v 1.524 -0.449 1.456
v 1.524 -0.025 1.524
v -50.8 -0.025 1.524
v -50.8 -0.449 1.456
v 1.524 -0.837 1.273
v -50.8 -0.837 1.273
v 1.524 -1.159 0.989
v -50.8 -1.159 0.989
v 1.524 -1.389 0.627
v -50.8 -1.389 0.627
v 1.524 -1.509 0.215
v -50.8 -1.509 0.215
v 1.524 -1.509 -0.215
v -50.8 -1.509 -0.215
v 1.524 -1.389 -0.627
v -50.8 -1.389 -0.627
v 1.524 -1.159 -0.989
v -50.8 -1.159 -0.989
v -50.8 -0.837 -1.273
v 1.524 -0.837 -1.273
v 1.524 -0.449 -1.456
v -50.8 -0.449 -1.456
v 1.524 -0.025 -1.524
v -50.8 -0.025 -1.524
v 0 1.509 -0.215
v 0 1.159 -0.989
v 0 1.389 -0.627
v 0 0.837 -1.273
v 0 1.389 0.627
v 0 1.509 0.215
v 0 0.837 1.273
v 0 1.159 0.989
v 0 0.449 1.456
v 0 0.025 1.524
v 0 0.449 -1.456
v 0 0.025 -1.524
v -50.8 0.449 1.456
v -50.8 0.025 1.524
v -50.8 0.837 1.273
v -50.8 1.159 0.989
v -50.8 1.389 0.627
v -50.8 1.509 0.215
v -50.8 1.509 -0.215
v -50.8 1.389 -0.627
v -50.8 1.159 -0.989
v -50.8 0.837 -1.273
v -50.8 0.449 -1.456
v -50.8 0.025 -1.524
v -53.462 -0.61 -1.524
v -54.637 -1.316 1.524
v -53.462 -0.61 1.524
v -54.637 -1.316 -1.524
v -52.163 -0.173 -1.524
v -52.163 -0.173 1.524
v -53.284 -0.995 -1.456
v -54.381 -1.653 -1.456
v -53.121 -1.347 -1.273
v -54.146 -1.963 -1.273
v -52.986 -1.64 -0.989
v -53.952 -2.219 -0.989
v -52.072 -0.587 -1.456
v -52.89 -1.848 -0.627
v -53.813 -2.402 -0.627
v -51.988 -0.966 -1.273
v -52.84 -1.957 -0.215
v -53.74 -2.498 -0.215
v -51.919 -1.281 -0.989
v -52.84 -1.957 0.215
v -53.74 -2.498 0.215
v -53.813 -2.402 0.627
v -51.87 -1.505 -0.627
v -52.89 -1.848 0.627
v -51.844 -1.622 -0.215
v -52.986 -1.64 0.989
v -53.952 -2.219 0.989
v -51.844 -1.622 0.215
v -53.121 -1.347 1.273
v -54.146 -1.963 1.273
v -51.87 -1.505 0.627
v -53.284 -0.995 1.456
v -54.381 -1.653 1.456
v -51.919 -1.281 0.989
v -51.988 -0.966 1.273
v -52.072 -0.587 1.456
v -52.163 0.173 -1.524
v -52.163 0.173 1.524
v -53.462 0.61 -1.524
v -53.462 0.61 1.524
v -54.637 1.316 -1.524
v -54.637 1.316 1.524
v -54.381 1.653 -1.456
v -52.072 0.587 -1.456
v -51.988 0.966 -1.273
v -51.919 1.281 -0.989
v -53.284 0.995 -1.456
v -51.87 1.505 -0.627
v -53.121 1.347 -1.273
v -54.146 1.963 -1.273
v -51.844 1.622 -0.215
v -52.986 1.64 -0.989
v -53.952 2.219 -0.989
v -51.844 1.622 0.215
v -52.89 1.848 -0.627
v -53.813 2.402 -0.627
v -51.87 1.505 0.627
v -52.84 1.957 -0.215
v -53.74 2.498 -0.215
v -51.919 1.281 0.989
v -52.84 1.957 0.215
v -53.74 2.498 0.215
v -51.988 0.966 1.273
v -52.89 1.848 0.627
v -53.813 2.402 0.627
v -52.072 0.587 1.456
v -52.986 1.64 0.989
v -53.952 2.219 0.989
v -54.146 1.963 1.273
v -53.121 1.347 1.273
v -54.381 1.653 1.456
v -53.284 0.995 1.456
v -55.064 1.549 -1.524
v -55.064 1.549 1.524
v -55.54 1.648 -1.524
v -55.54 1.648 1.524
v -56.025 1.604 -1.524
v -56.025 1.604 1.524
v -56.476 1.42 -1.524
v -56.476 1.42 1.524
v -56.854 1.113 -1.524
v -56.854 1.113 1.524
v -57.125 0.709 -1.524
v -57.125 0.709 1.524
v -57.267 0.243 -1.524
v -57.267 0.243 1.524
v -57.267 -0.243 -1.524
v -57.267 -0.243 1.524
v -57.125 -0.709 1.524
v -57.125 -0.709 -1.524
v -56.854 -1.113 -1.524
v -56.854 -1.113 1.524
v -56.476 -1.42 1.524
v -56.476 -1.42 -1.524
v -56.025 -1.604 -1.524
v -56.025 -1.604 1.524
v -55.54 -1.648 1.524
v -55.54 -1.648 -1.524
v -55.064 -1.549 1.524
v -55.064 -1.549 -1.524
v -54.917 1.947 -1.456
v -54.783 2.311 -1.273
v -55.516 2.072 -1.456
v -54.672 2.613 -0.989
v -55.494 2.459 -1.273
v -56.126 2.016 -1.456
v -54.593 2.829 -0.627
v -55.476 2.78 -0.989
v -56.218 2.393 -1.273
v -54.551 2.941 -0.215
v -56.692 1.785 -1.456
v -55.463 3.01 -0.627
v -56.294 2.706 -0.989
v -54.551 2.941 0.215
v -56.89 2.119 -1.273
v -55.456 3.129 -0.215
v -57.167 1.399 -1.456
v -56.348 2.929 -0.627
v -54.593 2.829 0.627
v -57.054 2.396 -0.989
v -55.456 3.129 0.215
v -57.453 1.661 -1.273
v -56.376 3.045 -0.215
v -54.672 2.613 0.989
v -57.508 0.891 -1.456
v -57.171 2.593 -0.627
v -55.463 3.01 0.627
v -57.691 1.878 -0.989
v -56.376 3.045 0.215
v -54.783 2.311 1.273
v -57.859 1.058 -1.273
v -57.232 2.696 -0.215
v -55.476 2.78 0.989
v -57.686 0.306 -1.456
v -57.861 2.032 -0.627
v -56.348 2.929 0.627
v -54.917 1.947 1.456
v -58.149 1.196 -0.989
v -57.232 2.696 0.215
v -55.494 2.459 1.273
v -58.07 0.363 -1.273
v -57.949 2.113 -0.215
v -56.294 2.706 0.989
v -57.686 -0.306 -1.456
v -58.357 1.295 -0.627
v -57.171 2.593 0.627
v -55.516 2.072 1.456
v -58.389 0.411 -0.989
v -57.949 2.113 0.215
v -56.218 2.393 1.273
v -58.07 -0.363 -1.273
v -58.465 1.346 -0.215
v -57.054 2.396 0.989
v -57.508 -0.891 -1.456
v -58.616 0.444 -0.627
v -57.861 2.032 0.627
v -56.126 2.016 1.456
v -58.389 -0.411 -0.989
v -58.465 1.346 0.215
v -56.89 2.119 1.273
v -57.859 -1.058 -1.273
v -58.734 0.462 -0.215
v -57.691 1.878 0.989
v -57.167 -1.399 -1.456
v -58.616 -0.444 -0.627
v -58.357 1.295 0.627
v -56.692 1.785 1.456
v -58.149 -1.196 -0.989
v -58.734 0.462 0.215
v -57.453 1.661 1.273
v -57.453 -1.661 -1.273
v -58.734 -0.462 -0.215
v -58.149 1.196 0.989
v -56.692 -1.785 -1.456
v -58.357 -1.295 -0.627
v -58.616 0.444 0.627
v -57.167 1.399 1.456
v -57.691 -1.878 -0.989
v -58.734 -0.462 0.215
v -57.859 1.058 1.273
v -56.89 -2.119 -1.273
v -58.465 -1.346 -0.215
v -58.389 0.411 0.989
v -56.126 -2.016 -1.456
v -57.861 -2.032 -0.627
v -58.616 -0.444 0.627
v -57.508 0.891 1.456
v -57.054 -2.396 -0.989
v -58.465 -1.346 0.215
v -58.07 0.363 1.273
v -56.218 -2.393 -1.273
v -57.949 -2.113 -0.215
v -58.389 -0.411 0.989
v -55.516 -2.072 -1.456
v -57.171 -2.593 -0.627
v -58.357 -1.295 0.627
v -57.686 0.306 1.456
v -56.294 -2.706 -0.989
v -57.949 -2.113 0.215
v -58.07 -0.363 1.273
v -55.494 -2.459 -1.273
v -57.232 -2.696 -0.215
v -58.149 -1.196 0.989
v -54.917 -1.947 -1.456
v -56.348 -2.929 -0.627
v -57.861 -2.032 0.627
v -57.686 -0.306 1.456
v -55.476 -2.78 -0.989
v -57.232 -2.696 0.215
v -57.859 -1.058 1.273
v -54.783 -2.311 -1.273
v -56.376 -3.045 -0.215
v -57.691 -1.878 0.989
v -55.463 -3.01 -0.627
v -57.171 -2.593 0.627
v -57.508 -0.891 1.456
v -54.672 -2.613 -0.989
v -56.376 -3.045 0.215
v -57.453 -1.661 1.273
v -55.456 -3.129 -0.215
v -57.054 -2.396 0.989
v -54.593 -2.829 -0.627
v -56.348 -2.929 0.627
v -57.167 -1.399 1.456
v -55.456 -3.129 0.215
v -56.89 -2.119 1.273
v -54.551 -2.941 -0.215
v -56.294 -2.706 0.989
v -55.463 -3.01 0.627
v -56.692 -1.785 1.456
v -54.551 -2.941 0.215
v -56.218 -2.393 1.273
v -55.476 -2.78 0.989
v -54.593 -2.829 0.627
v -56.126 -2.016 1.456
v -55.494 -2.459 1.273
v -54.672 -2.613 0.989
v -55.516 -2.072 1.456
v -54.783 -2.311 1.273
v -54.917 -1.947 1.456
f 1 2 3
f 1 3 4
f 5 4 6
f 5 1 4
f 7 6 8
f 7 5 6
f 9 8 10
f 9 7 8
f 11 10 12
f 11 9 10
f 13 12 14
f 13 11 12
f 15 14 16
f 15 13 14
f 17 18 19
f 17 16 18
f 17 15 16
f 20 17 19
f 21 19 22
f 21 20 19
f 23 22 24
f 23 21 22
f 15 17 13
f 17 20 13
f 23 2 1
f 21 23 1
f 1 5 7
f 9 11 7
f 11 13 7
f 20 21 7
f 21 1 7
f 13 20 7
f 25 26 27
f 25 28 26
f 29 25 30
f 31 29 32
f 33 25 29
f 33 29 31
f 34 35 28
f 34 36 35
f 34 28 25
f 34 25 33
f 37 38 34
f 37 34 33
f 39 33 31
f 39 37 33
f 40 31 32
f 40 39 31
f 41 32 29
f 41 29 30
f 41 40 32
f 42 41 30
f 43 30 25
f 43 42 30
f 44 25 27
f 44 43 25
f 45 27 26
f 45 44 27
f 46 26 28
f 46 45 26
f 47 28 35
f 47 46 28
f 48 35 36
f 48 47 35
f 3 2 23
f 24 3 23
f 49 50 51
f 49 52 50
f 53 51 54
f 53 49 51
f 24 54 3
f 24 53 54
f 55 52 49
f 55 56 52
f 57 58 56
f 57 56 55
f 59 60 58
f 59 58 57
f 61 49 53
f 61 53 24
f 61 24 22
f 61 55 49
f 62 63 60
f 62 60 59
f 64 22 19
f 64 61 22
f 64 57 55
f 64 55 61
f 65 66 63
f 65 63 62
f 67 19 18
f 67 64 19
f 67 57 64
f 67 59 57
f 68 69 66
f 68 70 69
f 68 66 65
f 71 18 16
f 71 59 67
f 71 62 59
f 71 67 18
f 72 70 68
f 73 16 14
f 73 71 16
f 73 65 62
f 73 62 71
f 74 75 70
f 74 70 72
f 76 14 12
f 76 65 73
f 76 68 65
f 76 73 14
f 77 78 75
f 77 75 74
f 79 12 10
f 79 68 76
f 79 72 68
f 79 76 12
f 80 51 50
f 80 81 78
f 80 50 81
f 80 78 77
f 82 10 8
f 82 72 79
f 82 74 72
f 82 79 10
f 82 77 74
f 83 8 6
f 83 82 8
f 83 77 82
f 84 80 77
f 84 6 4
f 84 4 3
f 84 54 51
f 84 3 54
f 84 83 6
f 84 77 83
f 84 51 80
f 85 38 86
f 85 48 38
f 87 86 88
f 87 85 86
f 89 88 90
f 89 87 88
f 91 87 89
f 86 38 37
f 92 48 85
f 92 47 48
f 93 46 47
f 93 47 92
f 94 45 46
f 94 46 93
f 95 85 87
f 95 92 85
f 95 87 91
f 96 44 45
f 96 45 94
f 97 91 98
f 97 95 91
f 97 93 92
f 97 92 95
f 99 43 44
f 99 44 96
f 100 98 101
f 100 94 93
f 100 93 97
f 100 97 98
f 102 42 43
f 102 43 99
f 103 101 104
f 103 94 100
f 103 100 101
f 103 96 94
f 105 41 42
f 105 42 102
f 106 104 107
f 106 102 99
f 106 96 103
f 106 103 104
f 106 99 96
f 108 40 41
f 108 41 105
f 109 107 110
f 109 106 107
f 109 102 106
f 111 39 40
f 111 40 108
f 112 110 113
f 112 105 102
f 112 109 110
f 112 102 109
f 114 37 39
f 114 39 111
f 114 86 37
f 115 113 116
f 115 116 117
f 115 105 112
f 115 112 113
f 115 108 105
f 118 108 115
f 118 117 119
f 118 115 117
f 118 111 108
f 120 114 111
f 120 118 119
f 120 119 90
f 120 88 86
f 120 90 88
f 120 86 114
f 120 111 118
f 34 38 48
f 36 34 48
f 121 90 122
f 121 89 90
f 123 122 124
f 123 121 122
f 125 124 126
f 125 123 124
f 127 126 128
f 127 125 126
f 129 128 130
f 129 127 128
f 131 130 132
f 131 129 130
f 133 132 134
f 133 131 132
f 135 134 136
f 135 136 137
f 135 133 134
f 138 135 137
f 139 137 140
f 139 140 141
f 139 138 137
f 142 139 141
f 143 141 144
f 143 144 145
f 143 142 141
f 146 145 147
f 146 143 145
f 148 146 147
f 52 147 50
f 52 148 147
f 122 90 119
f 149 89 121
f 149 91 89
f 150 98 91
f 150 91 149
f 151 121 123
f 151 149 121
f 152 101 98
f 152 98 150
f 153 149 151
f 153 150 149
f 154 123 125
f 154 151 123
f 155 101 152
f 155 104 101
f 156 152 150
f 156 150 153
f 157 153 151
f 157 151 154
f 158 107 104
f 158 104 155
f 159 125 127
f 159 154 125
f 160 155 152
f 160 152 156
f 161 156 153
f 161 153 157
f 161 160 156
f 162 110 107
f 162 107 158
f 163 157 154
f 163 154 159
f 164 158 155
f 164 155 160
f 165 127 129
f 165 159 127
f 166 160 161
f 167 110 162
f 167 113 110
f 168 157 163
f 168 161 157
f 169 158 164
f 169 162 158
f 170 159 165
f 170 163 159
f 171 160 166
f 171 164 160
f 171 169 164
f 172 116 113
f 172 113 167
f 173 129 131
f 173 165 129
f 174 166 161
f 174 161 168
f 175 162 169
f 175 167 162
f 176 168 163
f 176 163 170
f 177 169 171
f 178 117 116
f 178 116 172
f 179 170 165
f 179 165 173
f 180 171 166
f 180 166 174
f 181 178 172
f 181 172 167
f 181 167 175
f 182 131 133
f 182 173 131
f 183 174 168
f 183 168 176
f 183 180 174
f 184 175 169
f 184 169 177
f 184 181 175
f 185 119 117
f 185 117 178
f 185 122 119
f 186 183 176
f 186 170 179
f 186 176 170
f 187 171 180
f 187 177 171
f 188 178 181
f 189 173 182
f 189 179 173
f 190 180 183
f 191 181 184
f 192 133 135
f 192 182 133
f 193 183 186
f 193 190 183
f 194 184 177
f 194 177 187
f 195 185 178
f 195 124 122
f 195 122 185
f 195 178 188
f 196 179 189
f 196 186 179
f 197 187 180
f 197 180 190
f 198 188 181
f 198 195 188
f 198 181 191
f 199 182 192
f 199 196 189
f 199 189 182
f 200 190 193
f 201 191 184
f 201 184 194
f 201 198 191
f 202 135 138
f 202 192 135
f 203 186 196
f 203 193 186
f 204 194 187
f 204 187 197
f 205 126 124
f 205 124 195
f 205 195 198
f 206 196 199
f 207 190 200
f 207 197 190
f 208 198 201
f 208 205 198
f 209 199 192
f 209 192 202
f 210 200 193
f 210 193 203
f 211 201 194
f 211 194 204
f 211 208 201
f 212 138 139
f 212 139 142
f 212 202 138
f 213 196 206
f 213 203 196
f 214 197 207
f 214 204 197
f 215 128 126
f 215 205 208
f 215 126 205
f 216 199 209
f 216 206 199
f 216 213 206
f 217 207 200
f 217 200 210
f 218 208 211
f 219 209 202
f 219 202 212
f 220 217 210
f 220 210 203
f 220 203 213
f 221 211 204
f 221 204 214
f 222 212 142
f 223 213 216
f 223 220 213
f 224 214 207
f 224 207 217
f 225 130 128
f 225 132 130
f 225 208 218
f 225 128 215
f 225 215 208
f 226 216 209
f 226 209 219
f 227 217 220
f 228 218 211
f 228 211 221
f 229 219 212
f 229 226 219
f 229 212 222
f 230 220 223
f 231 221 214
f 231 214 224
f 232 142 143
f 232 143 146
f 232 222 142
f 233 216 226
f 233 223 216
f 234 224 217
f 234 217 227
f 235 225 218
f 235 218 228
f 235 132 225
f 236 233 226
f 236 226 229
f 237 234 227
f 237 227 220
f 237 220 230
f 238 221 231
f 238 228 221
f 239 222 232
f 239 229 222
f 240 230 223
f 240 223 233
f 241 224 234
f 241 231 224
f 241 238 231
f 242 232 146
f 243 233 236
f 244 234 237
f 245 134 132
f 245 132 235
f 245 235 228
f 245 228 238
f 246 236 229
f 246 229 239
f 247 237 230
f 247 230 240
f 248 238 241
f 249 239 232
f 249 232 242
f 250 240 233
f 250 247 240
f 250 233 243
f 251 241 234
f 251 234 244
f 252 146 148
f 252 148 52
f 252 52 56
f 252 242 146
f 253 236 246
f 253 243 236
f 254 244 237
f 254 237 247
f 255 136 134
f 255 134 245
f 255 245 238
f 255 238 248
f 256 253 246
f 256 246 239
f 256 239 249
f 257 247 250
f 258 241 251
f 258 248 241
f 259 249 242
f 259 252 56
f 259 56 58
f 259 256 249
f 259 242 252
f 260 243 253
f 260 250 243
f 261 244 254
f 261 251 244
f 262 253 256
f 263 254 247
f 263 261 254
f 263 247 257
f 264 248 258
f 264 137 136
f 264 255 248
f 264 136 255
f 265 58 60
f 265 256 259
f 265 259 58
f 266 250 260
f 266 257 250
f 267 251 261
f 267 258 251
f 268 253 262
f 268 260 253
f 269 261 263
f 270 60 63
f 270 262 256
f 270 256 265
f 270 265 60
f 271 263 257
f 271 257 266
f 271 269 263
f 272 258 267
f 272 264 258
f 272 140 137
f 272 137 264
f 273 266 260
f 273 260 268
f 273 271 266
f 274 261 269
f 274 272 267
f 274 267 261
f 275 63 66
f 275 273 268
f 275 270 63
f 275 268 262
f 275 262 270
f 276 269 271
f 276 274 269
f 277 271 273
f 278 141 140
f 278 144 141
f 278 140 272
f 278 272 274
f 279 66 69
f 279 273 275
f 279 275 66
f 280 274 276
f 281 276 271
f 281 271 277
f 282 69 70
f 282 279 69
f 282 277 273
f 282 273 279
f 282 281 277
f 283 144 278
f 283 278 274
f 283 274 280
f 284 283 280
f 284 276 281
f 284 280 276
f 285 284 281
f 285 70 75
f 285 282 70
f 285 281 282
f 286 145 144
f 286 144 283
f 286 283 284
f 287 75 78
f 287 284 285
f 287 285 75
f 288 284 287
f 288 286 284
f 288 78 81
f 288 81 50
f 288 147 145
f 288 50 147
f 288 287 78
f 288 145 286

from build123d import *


with BuildPart() as part:
    # Sweep1: sweep along a path in Sketch3
    with BuildLine(Plane.XY) as sweep1_path:
        Line((0, 0.0254), (-50.8, 0.0254))
        ThreePointArc((-50.8, 0.0254), (-52.823920445, 0.356575694), (-54.636731203, 1.31555873))
        ThreePointArc((-54.636731203, 1.31555873), (-57.285281316, 0), (-54.636731203, -1.31555873))
        ThreePointArc((-54.636731203, -1.31555873), (-52.823920445, -0.356575694), (-50.8, -0.0254))
        Line((-50.8, -0.0254), (1.524, -0.0254))
    # Sketch4 → Sweep1 (sweep)
    with BuildSketch(Plane(origin=(0, 0, 0), x_dir=(0, 0, -1), z_dir=(1, 0, 0))):
        with BuildLine():
            Line((-1.523788319, 0.0254), (1.523788319, 0.0254))
            ThreePointArc((1.523788319, 0.0254), (0, 1.524), (-1.523788319, 0.0254))
        make_face()
    sweep(path=sweep1_path.line)


solid = part.part
